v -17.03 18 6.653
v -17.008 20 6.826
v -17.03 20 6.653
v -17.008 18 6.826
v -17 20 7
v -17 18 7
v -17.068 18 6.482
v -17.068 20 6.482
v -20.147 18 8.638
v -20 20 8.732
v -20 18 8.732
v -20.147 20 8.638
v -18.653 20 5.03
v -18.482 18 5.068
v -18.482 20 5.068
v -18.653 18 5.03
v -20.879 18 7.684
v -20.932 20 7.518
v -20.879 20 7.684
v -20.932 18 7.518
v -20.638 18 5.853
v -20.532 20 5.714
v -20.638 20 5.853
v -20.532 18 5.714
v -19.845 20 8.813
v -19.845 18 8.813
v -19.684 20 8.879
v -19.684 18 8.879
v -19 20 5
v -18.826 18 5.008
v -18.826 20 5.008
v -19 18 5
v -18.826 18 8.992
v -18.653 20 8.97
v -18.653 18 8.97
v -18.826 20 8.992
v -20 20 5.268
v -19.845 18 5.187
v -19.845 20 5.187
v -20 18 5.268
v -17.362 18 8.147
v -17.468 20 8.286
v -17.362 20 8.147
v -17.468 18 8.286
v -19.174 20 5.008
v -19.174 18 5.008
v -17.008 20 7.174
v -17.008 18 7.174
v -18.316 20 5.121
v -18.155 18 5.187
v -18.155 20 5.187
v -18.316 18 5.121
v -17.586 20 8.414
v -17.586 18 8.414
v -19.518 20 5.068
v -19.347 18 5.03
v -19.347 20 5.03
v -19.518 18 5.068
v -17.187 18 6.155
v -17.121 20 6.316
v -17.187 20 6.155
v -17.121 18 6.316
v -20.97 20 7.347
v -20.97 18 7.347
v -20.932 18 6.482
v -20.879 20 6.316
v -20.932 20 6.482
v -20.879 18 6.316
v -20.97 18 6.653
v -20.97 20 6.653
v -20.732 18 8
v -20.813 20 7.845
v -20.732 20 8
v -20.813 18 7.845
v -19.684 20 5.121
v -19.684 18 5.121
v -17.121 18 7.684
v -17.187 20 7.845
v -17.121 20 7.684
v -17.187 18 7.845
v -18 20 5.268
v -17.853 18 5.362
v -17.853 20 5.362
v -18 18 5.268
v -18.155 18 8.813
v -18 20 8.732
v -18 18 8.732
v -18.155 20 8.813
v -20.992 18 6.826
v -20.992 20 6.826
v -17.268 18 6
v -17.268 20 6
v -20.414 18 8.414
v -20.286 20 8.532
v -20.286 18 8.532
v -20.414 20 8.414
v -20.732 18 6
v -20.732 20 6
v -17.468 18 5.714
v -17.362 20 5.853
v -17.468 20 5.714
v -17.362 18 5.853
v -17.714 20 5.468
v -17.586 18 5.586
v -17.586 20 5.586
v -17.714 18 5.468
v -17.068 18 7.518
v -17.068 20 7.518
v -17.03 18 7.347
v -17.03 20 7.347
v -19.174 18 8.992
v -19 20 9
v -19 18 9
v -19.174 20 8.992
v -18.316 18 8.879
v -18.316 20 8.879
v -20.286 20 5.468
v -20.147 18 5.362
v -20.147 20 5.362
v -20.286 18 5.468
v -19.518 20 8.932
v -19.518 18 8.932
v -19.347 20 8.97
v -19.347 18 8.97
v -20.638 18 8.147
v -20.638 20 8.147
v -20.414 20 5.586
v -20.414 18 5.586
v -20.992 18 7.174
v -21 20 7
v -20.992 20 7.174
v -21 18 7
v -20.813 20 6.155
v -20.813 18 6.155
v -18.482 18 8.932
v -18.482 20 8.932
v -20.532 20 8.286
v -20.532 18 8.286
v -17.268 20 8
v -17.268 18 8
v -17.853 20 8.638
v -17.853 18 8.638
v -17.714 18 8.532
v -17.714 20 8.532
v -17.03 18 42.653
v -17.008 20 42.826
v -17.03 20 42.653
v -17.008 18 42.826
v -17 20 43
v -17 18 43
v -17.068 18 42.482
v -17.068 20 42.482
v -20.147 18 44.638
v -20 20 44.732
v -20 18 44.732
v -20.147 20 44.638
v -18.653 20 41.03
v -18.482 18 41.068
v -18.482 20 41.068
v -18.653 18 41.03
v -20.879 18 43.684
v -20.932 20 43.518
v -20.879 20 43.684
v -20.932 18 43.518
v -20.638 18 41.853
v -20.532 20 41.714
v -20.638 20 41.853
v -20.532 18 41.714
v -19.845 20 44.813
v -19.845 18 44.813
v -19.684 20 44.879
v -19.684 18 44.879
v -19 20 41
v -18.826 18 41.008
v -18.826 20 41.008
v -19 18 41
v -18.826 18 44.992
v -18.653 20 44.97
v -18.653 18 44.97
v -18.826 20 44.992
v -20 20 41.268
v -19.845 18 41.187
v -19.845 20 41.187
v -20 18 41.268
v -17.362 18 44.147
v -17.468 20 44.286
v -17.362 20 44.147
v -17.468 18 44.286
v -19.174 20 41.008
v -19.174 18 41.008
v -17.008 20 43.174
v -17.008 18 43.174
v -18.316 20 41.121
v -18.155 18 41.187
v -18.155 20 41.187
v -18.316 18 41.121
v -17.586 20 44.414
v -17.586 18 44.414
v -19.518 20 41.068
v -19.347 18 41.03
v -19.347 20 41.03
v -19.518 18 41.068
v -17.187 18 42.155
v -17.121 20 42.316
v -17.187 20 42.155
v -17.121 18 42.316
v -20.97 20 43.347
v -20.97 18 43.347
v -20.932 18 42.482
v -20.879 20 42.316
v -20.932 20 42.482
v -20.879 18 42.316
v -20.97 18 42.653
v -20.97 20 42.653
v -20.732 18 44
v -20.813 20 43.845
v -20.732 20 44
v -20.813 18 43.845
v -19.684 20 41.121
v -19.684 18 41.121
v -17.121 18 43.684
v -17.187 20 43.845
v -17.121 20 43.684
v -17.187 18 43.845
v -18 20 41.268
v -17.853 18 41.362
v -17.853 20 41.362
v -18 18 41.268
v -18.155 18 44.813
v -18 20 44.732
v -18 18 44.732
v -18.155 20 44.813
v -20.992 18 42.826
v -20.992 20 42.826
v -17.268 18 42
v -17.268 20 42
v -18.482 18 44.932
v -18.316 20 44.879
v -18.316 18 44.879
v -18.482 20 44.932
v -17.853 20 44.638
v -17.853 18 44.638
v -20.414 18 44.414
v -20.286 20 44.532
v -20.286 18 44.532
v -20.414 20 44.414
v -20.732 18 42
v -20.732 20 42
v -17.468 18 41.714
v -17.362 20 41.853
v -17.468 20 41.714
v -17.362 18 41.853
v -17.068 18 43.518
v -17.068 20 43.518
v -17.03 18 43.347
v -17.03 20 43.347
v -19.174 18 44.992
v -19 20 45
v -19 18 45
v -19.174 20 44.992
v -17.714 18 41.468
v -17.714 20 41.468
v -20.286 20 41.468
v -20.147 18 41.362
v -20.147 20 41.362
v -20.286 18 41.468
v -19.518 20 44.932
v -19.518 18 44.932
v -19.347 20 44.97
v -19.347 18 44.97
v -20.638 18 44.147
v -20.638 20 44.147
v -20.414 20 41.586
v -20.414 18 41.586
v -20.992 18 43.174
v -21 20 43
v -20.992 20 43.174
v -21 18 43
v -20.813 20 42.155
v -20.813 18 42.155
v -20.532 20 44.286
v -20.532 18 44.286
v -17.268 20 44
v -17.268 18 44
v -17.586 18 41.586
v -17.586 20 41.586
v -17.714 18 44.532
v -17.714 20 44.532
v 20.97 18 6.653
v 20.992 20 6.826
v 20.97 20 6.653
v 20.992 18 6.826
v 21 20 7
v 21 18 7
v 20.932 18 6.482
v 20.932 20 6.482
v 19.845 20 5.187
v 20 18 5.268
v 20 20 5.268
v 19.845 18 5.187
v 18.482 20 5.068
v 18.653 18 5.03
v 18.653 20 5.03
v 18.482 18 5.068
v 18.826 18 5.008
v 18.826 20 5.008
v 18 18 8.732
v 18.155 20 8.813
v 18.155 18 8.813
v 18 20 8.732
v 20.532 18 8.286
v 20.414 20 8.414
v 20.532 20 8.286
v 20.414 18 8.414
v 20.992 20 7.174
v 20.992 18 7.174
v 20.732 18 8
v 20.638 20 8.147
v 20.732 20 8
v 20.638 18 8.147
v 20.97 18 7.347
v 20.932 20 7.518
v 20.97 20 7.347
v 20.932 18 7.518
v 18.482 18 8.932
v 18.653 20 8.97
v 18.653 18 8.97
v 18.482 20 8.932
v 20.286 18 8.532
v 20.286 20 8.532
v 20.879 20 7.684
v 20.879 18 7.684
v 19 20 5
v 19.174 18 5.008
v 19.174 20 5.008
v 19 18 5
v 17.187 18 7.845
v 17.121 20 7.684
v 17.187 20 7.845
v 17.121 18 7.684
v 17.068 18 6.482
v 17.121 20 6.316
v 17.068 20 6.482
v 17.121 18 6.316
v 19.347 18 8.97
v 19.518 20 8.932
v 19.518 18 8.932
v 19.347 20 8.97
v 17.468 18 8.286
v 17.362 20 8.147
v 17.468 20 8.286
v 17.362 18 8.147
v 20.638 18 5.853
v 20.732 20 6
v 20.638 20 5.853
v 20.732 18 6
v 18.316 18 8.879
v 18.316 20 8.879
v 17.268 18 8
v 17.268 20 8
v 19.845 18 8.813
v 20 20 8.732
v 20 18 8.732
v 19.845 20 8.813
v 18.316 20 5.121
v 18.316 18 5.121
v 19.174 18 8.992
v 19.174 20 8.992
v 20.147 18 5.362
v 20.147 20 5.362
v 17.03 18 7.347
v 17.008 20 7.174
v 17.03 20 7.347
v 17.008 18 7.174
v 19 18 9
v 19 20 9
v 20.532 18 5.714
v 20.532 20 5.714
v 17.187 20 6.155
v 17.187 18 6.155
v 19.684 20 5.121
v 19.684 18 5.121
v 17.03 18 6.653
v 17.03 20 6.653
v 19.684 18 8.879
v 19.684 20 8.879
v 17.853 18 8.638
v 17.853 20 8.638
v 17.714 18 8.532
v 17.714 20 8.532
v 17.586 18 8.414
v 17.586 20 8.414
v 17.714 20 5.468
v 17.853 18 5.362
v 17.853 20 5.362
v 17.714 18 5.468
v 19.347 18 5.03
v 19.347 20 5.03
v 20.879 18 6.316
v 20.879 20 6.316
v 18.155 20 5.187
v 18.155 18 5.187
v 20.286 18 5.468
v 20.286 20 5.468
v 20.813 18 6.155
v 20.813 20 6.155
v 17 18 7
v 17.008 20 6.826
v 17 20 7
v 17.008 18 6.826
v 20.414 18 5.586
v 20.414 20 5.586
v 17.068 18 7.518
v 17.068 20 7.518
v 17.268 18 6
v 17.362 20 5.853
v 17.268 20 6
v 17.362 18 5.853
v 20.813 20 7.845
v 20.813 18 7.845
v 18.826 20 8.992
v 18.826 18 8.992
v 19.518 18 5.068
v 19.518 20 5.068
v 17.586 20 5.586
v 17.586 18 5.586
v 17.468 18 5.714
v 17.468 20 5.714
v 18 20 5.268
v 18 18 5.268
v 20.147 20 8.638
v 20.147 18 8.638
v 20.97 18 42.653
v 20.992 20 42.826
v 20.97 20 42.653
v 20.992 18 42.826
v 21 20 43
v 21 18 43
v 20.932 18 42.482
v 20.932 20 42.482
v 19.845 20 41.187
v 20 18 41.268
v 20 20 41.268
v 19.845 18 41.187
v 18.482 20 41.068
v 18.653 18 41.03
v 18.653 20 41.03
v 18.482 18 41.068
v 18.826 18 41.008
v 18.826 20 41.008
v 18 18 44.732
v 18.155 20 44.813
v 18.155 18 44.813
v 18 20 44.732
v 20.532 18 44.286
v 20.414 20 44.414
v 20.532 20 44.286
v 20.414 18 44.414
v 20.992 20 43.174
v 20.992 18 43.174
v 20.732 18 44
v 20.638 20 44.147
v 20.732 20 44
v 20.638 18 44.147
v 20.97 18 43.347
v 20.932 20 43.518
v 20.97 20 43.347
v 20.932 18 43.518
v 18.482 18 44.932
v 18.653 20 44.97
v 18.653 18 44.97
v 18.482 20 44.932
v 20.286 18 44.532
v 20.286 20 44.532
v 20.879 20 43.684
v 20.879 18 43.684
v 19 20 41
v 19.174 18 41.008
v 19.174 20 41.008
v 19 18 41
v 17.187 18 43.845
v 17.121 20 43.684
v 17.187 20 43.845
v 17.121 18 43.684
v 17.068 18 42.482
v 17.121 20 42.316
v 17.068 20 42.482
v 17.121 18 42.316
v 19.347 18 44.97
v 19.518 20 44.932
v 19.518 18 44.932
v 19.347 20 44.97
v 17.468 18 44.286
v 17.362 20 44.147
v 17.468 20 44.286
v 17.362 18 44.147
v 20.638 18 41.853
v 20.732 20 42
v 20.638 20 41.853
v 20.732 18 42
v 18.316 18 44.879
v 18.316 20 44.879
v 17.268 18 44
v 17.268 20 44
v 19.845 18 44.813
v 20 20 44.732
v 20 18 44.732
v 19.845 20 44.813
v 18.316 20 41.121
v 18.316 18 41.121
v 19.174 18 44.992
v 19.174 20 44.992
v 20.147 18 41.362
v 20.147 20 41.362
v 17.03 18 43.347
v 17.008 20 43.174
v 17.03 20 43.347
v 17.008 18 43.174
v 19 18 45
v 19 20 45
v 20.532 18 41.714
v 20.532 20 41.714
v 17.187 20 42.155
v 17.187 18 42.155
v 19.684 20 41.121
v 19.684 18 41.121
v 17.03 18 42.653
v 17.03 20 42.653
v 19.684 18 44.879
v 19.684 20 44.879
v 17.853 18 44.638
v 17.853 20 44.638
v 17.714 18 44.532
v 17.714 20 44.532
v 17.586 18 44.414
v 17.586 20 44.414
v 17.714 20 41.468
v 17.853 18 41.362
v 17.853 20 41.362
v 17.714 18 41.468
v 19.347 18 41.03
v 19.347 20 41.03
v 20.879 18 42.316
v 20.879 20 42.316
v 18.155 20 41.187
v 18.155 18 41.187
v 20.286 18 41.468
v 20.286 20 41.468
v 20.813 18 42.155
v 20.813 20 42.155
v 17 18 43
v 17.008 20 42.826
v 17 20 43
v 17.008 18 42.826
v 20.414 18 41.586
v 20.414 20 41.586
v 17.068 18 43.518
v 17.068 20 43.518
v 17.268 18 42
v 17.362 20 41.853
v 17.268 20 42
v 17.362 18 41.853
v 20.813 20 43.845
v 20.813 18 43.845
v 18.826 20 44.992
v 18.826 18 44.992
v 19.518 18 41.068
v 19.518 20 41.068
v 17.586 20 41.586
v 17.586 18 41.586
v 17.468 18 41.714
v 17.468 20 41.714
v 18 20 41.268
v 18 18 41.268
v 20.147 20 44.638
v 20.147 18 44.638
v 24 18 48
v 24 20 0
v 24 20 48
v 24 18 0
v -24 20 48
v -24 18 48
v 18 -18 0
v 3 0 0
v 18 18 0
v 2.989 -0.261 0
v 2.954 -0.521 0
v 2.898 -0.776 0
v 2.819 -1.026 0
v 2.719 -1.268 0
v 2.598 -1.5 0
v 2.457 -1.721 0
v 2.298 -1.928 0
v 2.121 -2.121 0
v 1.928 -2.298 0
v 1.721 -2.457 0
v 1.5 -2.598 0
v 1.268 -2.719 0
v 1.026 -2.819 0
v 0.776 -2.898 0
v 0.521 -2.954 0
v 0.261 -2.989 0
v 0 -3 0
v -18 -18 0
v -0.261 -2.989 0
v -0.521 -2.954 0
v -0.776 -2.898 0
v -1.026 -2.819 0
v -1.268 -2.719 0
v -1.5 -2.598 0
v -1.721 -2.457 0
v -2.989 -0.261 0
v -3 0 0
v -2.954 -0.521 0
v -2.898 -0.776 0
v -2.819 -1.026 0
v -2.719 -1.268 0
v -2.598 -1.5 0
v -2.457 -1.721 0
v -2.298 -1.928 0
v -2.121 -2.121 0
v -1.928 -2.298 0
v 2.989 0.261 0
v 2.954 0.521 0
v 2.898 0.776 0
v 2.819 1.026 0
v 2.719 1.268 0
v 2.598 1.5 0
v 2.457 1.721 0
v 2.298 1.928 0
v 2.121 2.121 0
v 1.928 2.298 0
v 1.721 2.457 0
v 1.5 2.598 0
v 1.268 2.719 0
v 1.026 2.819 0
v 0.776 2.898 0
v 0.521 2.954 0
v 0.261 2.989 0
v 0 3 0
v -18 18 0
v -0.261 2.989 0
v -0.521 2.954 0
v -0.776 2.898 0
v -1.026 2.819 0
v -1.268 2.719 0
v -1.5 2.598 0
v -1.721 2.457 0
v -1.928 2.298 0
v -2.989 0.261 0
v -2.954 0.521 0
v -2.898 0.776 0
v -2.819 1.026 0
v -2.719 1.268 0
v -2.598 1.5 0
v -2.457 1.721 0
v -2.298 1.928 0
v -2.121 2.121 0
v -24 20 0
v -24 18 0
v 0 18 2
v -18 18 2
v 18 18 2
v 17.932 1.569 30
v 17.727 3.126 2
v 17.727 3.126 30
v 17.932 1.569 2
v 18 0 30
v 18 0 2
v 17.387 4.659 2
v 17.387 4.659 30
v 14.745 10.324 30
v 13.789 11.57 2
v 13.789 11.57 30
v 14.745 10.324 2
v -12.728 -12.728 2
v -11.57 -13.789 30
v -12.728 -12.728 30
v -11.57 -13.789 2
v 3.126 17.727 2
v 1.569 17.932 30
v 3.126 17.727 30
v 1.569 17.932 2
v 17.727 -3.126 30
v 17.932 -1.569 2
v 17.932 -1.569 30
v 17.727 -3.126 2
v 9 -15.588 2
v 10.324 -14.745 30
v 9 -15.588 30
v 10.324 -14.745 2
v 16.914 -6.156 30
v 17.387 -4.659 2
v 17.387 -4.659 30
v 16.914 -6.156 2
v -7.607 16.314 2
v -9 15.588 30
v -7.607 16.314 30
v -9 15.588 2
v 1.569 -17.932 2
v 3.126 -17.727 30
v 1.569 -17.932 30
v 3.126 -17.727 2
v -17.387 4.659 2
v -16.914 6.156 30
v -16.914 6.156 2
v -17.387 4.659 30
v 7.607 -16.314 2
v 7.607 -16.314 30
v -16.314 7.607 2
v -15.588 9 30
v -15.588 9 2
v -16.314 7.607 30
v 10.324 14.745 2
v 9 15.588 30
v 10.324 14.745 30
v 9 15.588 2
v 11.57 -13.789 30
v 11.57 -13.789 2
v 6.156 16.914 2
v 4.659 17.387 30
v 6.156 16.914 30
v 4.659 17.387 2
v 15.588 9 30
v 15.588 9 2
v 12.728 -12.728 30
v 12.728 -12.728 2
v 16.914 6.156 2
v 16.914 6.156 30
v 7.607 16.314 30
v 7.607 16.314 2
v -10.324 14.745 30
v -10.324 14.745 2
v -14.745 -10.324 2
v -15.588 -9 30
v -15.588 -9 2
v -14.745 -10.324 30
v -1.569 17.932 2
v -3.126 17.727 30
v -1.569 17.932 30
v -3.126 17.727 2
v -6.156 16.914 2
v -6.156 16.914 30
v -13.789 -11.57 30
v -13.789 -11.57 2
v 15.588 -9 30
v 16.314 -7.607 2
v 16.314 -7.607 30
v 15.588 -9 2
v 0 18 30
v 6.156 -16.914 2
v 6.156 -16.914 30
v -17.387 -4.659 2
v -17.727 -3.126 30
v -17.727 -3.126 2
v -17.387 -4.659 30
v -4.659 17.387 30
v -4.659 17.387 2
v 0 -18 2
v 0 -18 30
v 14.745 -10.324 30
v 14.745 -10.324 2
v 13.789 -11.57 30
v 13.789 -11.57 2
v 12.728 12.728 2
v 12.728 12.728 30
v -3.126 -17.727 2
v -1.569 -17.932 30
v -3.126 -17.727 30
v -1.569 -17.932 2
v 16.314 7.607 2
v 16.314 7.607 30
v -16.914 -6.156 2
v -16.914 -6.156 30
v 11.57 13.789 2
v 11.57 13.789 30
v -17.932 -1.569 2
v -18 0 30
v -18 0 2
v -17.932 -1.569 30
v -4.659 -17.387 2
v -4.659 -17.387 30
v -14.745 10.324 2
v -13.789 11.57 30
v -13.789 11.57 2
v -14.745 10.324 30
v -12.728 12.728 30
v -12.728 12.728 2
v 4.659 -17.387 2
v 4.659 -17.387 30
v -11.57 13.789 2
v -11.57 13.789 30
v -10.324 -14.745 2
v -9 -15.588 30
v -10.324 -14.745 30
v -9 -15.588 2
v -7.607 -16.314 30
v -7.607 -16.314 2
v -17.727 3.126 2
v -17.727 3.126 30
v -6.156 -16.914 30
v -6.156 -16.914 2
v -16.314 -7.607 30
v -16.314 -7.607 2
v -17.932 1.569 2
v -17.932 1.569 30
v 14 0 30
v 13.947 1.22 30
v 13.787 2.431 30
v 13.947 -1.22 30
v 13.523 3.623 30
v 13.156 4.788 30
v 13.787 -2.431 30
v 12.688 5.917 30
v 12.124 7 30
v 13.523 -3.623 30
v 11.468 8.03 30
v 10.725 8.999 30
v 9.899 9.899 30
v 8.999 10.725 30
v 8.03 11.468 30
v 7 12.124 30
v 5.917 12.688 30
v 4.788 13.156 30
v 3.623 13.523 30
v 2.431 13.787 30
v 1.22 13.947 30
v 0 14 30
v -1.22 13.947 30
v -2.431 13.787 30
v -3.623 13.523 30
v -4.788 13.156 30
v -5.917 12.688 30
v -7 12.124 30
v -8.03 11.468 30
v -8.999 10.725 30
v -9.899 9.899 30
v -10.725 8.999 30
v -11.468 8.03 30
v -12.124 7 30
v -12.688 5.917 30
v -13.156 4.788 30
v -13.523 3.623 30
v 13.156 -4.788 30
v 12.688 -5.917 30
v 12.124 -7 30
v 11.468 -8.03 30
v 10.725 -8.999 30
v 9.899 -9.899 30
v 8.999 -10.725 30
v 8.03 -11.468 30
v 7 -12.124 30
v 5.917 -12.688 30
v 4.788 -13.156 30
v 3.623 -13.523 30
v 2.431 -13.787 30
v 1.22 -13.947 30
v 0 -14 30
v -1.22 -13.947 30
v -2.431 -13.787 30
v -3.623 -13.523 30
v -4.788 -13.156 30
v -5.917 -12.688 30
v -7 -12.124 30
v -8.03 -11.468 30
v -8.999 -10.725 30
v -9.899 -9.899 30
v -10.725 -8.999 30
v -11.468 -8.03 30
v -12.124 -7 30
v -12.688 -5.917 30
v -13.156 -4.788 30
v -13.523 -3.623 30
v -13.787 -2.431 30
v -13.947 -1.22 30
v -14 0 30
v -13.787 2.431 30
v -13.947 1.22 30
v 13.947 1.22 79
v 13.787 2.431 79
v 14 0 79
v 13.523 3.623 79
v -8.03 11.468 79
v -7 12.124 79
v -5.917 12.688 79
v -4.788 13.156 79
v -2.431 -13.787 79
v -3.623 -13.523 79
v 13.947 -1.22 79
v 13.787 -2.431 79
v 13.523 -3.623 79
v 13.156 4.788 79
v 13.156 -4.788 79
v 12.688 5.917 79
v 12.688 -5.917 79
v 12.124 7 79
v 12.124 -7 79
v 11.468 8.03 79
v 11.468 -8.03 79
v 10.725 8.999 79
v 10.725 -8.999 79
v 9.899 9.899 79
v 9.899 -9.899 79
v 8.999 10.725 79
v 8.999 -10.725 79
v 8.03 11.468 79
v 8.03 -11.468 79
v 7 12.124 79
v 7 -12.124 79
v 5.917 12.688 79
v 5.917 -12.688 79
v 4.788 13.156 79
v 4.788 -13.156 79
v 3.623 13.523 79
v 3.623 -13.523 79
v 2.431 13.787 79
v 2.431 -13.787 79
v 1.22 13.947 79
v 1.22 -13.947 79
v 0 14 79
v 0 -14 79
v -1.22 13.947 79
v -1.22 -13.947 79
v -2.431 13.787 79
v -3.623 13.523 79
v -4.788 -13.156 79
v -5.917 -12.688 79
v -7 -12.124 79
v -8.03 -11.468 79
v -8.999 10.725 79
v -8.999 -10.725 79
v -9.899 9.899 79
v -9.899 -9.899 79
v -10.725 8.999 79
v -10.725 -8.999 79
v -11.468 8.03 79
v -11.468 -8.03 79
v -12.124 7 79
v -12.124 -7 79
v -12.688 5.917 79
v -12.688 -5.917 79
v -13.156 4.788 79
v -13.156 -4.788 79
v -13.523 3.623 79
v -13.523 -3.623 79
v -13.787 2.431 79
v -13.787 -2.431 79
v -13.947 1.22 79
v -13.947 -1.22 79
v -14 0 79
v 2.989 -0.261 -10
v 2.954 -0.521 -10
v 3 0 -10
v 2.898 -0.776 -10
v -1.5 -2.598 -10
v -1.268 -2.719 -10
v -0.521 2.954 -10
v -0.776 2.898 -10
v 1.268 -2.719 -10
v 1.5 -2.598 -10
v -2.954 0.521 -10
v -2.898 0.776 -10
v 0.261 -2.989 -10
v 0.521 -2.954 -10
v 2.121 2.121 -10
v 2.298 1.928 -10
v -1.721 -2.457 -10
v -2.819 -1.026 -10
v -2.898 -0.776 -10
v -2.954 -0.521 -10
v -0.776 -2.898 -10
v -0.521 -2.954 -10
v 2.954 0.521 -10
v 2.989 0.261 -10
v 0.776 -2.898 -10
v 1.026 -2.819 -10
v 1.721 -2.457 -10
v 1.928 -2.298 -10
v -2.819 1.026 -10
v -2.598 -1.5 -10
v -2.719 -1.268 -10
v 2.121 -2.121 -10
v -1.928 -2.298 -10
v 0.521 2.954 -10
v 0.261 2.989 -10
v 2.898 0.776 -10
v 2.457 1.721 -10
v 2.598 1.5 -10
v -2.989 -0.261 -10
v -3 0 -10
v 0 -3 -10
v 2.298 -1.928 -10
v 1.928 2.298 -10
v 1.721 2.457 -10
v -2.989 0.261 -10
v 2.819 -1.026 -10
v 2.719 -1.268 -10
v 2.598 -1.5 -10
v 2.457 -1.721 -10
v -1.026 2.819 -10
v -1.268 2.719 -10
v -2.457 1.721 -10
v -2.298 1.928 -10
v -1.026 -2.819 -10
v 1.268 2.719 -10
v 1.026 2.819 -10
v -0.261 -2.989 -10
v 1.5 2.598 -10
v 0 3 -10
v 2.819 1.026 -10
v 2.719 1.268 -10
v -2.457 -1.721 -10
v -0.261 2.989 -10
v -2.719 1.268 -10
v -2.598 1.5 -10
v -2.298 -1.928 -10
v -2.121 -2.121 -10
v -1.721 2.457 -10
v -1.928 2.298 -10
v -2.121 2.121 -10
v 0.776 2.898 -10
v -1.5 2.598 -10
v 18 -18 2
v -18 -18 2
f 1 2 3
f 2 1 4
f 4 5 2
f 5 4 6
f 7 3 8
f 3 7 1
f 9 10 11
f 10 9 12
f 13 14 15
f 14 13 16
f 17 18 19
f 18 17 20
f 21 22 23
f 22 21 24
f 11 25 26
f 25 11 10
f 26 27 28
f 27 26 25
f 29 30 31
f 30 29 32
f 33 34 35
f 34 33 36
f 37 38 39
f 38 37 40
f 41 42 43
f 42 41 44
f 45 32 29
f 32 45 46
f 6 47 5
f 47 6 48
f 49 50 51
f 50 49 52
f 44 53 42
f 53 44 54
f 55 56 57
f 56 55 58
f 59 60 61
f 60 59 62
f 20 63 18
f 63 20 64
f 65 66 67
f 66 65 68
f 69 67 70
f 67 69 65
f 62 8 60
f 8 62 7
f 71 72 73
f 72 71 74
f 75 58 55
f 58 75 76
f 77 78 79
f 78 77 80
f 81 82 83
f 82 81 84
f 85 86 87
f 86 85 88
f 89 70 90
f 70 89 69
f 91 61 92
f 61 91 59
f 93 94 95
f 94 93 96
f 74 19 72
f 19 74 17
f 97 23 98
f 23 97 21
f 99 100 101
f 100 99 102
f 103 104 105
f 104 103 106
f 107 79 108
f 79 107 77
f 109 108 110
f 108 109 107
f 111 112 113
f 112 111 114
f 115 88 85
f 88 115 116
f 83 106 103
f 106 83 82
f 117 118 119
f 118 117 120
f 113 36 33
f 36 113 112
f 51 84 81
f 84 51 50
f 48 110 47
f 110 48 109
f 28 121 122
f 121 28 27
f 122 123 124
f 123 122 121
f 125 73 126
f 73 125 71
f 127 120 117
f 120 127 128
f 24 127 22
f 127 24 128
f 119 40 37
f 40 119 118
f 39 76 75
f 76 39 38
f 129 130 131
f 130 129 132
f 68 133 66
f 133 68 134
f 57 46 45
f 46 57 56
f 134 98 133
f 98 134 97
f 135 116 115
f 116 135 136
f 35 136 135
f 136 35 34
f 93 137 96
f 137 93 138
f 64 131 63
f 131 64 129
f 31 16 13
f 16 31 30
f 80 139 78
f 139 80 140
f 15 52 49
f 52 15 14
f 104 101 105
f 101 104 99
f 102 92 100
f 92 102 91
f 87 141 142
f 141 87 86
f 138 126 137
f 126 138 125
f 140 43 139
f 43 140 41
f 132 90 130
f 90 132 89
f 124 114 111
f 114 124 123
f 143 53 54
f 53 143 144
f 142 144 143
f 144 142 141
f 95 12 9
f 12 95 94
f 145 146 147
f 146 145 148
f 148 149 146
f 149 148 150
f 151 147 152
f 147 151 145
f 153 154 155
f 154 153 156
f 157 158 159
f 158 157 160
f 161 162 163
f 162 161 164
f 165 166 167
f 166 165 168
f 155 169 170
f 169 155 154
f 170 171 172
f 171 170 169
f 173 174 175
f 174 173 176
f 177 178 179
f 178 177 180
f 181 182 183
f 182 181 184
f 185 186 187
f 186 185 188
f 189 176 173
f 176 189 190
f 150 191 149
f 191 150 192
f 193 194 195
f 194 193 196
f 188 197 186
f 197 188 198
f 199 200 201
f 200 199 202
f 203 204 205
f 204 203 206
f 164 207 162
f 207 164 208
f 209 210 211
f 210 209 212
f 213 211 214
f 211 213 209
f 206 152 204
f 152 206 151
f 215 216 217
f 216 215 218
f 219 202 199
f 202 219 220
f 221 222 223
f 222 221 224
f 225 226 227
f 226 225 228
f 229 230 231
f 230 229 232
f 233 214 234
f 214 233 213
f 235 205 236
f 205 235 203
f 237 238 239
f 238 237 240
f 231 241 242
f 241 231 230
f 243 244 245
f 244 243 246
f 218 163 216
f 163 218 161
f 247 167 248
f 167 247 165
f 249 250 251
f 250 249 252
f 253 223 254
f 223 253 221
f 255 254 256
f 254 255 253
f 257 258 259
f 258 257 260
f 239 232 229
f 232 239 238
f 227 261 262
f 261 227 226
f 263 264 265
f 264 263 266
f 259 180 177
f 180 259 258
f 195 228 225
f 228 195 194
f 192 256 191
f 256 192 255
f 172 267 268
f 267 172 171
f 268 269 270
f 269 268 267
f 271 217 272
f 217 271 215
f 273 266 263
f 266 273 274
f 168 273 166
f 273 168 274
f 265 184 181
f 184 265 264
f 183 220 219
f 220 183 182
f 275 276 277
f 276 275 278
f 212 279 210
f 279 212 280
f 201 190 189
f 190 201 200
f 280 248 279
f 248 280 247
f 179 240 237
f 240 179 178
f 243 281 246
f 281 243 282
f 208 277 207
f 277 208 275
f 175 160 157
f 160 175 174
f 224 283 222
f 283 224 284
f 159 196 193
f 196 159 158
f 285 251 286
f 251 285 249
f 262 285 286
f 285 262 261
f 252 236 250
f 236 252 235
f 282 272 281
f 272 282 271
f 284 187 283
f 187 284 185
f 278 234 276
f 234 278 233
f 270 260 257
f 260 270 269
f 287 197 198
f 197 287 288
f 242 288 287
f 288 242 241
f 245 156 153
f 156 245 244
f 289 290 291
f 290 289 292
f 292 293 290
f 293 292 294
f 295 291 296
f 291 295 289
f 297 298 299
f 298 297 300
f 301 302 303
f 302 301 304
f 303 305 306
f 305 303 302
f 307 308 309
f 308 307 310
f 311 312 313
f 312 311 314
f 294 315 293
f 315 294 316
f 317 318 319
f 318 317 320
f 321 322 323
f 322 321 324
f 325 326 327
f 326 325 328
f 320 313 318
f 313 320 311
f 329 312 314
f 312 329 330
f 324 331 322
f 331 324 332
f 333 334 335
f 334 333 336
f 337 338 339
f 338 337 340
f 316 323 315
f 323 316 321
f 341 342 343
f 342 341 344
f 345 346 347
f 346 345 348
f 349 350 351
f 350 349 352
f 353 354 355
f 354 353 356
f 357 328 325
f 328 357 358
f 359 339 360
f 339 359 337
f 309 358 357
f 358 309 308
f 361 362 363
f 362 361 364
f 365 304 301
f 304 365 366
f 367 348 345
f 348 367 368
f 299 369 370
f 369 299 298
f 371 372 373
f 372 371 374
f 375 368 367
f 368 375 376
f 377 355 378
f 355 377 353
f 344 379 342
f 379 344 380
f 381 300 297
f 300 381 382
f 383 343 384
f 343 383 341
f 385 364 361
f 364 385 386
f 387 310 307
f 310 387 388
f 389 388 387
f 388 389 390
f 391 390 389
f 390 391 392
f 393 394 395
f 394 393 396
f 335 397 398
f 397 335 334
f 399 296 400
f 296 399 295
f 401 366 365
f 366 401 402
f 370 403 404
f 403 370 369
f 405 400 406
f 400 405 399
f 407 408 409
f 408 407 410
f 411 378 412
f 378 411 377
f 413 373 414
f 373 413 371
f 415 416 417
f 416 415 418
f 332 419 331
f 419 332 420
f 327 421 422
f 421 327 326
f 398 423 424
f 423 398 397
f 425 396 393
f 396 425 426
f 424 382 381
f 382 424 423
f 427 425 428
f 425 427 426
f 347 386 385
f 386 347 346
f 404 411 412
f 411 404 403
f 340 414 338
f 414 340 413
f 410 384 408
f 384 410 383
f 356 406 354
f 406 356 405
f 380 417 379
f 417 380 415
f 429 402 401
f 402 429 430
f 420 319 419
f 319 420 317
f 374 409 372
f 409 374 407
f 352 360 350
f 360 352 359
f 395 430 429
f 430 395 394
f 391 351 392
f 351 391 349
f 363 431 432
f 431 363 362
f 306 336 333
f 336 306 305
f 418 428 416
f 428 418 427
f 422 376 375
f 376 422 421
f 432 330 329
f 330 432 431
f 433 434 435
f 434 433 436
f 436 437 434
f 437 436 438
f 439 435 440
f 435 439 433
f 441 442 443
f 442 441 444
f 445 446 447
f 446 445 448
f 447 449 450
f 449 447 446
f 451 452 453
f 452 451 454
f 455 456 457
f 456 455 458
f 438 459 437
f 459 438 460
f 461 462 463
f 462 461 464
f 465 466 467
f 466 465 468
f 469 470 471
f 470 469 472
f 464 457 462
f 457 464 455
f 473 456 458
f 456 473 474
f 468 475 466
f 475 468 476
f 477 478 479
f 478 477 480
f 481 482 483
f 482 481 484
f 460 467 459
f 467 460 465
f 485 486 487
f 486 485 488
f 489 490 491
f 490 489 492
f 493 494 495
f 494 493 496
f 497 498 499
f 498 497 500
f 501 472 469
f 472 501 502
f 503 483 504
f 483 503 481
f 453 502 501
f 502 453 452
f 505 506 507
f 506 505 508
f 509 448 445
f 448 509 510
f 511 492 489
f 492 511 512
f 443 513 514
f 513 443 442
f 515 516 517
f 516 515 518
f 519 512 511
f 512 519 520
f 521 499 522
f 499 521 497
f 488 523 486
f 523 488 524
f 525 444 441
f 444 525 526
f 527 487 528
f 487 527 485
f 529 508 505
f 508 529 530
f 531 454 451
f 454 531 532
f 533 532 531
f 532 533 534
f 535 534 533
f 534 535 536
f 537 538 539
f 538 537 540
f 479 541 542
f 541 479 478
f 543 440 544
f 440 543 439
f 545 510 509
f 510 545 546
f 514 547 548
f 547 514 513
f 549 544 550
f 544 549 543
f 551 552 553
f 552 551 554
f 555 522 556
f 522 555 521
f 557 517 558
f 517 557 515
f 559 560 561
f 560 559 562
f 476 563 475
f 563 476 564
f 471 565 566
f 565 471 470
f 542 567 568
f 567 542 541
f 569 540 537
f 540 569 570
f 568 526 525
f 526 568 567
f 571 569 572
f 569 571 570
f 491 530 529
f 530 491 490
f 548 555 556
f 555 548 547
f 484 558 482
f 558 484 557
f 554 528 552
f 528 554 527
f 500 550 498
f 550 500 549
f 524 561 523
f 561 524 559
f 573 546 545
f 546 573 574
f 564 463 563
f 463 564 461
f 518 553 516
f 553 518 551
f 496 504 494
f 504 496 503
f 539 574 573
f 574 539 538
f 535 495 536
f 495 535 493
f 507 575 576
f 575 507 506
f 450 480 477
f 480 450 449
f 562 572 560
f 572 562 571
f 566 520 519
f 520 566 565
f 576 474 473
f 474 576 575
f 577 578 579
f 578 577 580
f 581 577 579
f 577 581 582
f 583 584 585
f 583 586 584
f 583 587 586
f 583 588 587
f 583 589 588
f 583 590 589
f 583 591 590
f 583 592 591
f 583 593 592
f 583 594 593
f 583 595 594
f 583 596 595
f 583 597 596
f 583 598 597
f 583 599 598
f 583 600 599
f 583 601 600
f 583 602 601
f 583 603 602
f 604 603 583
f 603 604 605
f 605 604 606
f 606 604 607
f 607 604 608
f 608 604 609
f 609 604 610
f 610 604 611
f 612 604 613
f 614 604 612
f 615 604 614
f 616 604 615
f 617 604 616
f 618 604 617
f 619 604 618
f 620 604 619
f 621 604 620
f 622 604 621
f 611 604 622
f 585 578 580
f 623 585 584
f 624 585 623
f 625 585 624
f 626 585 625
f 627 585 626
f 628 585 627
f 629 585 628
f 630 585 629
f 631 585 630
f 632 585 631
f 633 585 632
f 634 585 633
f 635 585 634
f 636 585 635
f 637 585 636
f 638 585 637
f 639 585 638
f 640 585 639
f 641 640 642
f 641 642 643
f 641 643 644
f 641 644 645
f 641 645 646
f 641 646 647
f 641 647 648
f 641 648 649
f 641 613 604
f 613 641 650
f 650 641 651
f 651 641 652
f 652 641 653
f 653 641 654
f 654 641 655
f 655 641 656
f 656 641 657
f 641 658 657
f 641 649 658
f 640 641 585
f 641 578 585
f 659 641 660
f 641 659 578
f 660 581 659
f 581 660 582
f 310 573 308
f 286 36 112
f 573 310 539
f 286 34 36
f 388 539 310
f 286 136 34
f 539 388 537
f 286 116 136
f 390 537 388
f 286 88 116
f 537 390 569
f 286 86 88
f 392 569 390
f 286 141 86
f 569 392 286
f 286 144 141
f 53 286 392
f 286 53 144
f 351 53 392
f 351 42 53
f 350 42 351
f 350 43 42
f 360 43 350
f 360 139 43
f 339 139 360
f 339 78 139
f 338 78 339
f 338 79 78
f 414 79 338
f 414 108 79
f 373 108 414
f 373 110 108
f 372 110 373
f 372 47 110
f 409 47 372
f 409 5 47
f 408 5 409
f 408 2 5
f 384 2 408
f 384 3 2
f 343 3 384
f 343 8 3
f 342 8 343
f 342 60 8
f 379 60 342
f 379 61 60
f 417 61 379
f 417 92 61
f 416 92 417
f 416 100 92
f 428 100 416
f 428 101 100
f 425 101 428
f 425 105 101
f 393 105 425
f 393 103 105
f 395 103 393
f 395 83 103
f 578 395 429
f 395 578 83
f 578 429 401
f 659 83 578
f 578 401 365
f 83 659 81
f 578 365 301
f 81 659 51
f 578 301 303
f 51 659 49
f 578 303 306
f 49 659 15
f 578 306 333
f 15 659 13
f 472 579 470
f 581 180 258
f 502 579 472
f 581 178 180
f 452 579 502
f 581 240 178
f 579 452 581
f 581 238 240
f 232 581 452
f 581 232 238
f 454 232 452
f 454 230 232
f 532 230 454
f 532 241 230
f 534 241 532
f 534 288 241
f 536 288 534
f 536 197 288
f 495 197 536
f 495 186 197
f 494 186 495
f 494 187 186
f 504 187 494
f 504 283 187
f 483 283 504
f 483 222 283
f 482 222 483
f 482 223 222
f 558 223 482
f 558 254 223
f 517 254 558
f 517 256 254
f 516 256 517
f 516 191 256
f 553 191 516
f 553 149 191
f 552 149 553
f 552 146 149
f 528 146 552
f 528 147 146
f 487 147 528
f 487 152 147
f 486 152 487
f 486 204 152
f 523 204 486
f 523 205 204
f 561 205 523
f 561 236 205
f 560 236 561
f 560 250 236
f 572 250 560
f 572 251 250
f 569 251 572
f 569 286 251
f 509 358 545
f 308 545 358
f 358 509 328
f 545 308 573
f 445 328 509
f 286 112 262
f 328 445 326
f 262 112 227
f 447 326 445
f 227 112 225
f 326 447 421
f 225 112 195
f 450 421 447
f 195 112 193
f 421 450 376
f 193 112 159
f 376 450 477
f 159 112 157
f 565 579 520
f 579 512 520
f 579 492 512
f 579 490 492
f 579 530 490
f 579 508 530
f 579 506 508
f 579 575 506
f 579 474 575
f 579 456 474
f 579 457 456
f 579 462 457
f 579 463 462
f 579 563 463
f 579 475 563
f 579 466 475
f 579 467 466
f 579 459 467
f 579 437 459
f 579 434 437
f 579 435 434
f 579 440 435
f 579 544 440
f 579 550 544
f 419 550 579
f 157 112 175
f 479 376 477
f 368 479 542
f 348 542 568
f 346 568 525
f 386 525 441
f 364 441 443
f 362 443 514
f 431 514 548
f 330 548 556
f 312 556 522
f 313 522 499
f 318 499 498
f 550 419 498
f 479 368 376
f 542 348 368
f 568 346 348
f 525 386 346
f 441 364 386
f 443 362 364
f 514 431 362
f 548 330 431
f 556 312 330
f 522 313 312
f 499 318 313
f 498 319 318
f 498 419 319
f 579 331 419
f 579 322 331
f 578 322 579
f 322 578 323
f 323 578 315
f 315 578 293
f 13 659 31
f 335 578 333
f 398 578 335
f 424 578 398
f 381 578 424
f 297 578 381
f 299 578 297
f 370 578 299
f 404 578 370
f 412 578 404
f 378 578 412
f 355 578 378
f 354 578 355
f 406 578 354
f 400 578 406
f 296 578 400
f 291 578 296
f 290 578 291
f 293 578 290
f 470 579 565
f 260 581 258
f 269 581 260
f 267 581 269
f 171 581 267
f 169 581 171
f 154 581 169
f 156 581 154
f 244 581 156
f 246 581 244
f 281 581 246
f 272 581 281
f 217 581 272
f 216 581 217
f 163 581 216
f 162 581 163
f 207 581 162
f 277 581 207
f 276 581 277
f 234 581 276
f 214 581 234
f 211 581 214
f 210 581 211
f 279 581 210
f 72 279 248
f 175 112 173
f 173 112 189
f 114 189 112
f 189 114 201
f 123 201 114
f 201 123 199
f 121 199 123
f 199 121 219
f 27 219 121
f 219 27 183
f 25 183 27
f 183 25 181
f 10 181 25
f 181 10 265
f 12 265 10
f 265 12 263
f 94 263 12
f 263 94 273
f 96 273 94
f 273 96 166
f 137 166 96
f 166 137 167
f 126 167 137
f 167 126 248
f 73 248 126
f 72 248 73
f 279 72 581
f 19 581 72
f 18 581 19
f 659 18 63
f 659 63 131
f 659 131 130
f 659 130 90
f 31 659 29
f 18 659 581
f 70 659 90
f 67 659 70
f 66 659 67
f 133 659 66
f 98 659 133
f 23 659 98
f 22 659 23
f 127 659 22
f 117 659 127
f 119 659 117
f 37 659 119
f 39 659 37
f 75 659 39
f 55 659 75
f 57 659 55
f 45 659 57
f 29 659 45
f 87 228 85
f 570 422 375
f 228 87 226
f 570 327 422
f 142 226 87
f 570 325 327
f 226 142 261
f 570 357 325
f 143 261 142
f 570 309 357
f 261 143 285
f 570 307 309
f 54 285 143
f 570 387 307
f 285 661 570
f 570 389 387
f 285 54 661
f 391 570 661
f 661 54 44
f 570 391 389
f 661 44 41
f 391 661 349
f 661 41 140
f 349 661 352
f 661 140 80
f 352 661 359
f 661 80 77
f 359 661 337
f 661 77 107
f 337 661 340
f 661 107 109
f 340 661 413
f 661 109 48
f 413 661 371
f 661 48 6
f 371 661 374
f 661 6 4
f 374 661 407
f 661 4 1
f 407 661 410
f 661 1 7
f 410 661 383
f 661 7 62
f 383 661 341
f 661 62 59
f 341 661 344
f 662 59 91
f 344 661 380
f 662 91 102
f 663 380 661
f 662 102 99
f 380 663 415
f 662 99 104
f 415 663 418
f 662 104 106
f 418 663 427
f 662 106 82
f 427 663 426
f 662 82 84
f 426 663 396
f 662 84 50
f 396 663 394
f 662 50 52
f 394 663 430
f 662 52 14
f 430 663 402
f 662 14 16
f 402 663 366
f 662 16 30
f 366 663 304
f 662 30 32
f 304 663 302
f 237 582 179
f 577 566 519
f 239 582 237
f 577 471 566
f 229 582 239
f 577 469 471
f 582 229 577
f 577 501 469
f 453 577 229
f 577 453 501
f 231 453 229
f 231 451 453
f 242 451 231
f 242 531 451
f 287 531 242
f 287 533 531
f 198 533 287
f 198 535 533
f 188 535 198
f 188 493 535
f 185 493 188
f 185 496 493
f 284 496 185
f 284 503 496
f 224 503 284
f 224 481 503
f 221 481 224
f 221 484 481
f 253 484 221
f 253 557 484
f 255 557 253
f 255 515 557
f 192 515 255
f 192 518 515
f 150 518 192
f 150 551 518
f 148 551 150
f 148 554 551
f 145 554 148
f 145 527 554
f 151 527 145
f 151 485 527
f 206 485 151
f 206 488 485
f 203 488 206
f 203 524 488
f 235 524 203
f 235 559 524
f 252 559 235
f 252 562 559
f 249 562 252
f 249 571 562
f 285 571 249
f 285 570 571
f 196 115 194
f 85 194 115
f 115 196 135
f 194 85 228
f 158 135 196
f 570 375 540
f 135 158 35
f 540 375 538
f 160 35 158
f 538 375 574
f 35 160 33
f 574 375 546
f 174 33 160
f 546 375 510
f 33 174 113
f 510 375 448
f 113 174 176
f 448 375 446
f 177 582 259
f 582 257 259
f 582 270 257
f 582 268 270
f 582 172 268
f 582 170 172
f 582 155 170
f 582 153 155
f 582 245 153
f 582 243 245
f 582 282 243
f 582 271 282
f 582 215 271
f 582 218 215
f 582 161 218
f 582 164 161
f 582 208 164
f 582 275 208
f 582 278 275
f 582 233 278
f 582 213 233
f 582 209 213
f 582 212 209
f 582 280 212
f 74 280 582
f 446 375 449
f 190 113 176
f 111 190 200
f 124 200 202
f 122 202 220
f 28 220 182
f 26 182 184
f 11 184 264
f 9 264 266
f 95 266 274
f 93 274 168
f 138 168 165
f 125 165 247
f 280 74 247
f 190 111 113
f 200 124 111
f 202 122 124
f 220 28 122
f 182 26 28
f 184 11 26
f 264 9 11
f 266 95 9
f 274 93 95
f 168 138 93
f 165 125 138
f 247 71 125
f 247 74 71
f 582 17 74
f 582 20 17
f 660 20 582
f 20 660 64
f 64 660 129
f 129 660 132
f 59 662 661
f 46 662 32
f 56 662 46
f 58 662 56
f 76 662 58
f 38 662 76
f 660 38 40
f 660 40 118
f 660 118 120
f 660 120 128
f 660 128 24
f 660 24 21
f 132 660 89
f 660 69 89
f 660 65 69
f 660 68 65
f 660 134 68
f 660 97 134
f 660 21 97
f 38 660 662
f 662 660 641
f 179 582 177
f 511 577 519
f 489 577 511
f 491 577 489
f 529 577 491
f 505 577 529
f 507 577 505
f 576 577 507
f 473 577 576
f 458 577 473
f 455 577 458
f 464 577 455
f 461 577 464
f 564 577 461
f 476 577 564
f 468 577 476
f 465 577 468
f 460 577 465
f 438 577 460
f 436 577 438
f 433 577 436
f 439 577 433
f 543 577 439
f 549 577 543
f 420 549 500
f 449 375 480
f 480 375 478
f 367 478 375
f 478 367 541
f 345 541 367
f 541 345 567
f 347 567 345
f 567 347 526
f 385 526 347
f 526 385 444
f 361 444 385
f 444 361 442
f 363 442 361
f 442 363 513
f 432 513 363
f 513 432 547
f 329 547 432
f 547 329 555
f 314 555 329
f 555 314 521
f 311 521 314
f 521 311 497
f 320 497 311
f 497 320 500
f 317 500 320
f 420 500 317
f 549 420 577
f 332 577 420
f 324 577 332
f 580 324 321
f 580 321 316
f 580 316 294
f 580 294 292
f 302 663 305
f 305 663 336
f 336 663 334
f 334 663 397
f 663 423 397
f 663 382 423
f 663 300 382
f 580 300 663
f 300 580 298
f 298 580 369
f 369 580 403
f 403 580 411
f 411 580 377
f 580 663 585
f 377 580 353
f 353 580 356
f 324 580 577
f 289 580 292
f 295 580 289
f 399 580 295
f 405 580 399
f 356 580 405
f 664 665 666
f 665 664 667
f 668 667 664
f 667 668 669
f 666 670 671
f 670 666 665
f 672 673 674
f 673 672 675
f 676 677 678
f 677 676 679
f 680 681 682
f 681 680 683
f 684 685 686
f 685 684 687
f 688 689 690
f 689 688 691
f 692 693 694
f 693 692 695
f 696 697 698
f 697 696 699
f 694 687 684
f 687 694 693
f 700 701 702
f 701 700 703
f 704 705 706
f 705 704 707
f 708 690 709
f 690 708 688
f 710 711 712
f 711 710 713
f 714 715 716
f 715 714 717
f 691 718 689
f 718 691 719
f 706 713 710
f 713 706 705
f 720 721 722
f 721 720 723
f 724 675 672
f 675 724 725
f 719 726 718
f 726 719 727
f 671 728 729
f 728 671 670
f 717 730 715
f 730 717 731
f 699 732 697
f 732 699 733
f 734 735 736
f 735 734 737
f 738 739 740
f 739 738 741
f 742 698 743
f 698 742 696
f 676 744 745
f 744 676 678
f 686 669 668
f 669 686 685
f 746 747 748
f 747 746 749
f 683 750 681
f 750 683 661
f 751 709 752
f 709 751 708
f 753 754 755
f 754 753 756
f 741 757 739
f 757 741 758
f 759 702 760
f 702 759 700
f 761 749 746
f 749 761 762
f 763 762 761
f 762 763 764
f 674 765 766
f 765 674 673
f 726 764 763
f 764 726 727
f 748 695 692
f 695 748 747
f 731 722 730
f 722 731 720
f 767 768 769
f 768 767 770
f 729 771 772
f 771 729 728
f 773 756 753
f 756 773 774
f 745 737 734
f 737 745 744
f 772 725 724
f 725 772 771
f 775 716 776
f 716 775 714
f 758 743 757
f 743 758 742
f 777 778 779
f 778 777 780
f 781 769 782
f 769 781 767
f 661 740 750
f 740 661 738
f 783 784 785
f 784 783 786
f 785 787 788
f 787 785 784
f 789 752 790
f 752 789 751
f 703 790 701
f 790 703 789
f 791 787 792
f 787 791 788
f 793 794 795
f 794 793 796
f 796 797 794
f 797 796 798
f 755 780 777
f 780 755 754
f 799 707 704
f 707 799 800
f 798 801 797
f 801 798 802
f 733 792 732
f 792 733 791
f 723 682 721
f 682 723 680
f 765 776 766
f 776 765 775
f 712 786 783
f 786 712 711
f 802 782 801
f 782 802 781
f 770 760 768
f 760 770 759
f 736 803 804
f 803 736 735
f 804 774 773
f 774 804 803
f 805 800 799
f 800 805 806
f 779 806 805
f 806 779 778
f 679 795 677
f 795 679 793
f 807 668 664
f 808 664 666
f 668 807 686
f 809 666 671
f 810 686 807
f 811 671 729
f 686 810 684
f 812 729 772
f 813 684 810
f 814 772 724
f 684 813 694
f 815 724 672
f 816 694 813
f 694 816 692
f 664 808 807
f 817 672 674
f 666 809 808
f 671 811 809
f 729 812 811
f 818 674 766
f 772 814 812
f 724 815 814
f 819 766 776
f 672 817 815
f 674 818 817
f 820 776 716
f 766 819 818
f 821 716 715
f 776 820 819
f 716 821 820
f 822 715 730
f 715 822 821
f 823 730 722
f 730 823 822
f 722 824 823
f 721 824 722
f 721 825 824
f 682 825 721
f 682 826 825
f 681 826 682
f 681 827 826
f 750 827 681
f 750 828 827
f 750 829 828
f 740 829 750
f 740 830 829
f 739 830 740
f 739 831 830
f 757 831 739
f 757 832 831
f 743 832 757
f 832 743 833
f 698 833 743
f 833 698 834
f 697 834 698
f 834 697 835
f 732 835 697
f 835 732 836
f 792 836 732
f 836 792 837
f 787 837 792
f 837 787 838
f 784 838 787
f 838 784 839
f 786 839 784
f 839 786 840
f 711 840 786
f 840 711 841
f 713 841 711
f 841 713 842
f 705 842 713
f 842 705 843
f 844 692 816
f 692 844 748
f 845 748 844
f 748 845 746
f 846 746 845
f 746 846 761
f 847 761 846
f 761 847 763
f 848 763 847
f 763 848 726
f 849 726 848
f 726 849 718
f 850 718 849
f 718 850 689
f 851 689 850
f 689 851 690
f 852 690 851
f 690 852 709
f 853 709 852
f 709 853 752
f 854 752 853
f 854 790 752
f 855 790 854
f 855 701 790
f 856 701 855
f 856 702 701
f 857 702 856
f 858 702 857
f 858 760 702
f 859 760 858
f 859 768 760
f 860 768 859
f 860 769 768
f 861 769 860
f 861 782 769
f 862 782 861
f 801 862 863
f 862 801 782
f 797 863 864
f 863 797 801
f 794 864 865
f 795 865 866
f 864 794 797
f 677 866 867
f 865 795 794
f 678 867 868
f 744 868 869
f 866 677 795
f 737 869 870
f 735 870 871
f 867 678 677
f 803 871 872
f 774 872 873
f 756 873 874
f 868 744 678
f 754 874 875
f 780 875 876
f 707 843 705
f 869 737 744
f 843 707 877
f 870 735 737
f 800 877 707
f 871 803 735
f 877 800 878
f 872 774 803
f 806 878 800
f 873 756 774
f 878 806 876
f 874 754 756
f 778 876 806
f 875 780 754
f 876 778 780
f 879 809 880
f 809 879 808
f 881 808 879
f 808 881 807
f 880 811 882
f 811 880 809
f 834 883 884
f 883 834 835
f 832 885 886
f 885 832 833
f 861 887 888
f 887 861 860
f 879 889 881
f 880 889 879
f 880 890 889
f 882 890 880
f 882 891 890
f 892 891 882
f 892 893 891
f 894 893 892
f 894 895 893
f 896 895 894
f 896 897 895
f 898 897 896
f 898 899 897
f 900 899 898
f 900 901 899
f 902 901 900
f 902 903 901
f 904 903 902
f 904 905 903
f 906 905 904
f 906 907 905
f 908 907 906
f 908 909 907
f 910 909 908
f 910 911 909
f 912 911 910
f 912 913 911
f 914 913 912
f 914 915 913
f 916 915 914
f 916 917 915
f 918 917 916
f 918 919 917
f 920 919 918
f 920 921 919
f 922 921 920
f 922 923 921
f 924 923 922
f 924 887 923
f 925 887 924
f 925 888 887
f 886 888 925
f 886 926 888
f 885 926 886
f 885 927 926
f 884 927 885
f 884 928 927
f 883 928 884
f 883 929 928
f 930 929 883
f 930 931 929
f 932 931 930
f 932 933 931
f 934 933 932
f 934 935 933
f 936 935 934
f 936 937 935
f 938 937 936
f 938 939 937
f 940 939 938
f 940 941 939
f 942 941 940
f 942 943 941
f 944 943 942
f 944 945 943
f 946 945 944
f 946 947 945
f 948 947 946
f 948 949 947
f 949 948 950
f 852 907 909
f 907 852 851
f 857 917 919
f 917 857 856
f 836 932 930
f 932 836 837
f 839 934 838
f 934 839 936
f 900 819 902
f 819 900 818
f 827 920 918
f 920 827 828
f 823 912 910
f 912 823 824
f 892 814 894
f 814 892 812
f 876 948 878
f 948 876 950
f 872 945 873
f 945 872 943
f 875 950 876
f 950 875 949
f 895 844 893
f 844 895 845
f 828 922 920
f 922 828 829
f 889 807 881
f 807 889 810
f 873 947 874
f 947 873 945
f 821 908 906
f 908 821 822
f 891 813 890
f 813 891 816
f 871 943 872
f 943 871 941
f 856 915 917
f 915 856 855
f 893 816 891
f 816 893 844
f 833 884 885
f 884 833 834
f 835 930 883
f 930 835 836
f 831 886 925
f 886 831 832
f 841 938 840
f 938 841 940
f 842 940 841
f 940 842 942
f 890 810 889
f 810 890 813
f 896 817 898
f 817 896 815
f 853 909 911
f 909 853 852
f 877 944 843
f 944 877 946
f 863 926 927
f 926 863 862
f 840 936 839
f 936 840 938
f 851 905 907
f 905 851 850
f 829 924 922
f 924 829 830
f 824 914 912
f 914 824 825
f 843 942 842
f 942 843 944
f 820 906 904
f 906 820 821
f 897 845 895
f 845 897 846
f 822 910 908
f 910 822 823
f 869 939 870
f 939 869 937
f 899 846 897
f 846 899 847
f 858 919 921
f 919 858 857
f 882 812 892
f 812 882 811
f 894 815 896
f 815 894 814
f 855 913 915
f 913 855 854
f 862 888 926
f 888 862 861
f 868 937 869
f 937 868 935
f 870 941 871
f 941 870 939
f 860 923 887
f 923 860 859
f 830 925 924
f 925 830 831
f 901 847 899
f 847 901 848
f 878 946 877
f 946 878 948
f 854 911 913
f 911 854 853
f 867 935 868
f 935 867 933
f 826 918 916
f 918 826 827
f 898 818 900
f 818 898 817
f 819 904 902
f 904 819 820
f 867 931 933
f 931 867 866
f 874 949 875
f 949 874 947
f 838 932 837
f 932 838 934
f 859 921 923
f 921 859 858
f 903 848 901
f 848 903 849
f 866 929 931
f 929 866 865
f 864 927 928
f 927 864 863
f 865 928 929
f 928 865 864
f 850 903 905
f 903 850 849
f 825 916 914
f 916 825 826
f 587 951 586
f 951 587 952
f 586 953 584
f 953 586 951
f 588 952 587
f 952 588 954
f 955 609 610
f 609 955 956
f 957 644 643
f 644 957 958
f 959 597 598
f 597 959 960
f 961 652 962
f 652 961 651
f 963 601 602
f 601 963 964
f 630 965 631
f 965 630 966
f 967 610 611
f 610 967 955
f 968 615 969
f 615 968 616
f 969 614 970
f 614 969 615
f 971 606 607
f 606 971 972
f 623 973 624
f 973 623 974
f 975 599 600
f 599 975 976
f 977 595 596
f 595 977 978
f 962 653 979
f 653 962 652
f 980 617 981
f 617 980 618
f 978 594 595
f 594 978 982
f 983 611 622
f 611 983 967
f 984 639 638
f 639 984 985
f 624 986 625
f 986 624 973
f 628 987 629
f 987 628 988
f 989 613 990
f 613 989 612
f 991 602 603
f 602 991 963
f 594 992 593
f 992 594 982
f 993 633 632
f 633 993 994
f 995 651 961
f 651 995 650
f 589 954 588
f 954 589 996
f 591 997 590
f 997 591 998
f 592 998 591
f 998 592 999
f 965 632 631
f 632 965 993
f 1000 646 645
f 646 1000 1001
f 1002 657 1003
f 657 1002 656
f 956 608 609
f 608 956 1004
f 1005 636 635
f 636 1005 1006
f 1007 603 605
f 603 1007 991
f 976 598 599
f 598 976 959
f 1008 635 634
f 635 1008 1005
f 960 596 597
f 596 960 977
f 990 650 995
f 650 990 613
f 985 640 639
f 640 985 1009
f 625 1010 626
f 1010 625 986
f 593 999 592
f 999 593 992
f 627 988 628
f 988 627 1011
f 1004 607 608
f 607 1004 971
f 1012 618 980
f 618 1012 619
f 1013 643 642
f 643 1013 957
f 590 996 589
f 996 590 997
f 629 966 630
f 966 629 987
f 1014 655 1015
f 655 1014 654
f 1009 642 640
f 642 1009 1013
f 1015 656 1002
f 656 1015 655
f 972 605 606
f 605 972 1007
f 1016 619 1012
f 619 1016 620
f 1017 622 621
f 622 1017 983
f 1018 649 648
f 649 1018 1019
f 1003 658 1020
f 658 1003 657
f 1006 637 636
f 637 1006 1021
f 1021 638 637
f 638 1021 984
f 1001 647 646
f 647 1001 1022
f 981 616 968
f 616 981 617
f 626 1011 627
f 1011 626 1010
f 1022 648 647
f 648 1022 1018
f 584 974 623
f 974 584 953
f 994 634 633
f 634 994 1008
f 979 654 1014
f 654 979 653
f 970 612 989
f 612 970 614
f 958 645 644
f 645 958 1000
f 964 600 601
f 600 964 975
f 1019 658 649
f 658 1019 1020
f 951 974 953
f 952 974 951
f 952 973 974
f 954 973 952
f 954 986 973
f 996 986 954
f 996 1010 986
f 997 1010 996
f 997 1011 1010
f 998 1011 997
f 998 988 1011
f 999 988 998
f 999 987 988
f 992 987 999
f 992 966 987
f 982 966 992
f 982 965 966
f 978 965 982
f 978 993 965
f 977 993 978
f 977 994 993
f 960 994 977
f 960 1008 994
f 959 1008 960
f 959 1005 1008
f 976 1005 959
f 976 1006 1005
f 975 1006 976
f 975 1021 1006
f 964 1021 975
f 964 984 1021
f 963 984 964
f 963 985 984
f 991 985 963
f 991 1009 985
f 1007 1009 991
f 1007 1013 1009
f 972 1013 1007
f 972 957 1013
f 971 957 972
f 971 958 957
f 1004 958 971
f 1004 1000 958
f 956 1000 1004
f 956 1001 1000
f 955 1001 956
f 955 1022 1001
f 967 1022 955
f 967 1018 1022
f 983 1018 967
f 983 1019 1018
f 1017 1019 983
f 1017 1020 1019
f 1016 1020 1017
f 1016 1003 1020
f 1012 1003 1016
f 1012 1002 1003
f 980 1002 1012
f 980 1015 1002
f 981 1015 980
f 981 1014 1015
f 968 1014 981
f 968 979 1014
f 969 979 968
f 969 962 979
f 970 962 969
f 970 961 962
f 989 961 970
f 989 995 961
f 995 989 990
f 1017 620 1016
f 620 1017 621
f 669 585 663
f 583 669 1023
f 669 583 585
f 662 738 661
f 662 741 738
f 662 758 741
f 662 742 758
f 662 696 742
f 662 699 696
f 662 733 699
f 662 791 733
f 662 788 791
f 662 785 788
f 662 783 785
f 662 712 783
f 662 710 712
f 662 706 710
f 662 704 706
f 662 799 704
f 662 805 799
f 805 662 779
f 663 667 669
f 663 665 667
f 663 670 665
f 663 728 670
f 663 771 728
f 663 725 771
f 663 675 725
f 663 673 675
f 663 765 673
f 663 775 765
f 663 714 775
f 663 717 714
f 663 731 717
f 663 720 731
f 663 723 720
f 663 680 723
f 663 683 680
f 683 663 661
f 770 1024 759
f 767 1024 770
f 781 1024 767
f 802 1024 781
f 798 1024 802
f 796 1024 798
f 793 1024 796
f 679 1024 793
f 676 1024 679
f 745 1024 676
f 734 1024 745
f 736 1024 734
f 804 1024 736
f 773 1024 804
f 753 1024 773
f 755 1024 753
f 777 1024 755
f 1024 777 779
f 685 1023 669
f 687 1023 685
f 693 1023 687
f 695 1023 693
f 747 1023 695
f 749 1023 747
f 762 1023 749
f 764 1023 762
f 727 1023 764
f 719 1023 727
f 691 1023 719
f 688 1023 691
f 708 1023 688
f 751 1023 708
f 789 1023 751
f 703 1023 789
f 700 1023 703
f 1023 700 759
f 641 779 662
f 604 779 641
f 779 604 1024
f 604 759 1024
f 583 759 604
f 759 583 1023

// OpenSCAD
$fa = 5;
$fs = 0.1;

function motor_radius() = 18;

function motor_axis_radius() = 3;

function motor_axis_length() = 10;

function motor_bracket_length() = 48;

function motor_bracket_depth() = 2;

bracket_hole_offset = 5;
bracket_hole_radius = 2;

function motor_axis_offset() = motor_radius() + motor_bracket_depth();

function motor_bracket_holes_t() = [
  [-motor_bracket_length()/2+bracket_hole_offset,motor_radius(),bracket_hole_offset+motor_bracket_depth()],
  [-motor_bracket_length()/2+bracket_hole_offset,motor_radius(),motor_bracket_length()-bracket_hole_offset],
  [motor_bracket_length()/2-bracket_hole_offset,motor_radius(),bracket_hole_offset+motor_bracket_depth()],
  [motor_bracket_length()/2-bracket_hole_offset,motor_radius(),motor_bracket_length()-bracket_hole_offset]
];

module motor() {
  cylinder(30,r=motor_radius());
  translate([0,0,29])
    cylinder(50,r=14);
  rotate([180,0,0])
    cylinder(motor_axis_length(),r=motor_axis_radius());
  translate([-motor_radius(),-motor_radius(),0])
    cube([motor_radius()*2,motor_radius()*2,motor_bracket_depth()]);

  difference() {
    translate([-motor_bracket_length()/2,motor_radius(),0])
      cube([motor_bracket_length(),motor_bracket_depth(),motor_bracket_length()]);

    for (hole_t=motor_bracket_holes_t()) {
      translate(hole_t + [0,-1,0])
        rotate([-90,0,0])
          cylinder(motor_bracket_depth()+2,r=bracket_hole_radius);
    }
  }
}

motor();
